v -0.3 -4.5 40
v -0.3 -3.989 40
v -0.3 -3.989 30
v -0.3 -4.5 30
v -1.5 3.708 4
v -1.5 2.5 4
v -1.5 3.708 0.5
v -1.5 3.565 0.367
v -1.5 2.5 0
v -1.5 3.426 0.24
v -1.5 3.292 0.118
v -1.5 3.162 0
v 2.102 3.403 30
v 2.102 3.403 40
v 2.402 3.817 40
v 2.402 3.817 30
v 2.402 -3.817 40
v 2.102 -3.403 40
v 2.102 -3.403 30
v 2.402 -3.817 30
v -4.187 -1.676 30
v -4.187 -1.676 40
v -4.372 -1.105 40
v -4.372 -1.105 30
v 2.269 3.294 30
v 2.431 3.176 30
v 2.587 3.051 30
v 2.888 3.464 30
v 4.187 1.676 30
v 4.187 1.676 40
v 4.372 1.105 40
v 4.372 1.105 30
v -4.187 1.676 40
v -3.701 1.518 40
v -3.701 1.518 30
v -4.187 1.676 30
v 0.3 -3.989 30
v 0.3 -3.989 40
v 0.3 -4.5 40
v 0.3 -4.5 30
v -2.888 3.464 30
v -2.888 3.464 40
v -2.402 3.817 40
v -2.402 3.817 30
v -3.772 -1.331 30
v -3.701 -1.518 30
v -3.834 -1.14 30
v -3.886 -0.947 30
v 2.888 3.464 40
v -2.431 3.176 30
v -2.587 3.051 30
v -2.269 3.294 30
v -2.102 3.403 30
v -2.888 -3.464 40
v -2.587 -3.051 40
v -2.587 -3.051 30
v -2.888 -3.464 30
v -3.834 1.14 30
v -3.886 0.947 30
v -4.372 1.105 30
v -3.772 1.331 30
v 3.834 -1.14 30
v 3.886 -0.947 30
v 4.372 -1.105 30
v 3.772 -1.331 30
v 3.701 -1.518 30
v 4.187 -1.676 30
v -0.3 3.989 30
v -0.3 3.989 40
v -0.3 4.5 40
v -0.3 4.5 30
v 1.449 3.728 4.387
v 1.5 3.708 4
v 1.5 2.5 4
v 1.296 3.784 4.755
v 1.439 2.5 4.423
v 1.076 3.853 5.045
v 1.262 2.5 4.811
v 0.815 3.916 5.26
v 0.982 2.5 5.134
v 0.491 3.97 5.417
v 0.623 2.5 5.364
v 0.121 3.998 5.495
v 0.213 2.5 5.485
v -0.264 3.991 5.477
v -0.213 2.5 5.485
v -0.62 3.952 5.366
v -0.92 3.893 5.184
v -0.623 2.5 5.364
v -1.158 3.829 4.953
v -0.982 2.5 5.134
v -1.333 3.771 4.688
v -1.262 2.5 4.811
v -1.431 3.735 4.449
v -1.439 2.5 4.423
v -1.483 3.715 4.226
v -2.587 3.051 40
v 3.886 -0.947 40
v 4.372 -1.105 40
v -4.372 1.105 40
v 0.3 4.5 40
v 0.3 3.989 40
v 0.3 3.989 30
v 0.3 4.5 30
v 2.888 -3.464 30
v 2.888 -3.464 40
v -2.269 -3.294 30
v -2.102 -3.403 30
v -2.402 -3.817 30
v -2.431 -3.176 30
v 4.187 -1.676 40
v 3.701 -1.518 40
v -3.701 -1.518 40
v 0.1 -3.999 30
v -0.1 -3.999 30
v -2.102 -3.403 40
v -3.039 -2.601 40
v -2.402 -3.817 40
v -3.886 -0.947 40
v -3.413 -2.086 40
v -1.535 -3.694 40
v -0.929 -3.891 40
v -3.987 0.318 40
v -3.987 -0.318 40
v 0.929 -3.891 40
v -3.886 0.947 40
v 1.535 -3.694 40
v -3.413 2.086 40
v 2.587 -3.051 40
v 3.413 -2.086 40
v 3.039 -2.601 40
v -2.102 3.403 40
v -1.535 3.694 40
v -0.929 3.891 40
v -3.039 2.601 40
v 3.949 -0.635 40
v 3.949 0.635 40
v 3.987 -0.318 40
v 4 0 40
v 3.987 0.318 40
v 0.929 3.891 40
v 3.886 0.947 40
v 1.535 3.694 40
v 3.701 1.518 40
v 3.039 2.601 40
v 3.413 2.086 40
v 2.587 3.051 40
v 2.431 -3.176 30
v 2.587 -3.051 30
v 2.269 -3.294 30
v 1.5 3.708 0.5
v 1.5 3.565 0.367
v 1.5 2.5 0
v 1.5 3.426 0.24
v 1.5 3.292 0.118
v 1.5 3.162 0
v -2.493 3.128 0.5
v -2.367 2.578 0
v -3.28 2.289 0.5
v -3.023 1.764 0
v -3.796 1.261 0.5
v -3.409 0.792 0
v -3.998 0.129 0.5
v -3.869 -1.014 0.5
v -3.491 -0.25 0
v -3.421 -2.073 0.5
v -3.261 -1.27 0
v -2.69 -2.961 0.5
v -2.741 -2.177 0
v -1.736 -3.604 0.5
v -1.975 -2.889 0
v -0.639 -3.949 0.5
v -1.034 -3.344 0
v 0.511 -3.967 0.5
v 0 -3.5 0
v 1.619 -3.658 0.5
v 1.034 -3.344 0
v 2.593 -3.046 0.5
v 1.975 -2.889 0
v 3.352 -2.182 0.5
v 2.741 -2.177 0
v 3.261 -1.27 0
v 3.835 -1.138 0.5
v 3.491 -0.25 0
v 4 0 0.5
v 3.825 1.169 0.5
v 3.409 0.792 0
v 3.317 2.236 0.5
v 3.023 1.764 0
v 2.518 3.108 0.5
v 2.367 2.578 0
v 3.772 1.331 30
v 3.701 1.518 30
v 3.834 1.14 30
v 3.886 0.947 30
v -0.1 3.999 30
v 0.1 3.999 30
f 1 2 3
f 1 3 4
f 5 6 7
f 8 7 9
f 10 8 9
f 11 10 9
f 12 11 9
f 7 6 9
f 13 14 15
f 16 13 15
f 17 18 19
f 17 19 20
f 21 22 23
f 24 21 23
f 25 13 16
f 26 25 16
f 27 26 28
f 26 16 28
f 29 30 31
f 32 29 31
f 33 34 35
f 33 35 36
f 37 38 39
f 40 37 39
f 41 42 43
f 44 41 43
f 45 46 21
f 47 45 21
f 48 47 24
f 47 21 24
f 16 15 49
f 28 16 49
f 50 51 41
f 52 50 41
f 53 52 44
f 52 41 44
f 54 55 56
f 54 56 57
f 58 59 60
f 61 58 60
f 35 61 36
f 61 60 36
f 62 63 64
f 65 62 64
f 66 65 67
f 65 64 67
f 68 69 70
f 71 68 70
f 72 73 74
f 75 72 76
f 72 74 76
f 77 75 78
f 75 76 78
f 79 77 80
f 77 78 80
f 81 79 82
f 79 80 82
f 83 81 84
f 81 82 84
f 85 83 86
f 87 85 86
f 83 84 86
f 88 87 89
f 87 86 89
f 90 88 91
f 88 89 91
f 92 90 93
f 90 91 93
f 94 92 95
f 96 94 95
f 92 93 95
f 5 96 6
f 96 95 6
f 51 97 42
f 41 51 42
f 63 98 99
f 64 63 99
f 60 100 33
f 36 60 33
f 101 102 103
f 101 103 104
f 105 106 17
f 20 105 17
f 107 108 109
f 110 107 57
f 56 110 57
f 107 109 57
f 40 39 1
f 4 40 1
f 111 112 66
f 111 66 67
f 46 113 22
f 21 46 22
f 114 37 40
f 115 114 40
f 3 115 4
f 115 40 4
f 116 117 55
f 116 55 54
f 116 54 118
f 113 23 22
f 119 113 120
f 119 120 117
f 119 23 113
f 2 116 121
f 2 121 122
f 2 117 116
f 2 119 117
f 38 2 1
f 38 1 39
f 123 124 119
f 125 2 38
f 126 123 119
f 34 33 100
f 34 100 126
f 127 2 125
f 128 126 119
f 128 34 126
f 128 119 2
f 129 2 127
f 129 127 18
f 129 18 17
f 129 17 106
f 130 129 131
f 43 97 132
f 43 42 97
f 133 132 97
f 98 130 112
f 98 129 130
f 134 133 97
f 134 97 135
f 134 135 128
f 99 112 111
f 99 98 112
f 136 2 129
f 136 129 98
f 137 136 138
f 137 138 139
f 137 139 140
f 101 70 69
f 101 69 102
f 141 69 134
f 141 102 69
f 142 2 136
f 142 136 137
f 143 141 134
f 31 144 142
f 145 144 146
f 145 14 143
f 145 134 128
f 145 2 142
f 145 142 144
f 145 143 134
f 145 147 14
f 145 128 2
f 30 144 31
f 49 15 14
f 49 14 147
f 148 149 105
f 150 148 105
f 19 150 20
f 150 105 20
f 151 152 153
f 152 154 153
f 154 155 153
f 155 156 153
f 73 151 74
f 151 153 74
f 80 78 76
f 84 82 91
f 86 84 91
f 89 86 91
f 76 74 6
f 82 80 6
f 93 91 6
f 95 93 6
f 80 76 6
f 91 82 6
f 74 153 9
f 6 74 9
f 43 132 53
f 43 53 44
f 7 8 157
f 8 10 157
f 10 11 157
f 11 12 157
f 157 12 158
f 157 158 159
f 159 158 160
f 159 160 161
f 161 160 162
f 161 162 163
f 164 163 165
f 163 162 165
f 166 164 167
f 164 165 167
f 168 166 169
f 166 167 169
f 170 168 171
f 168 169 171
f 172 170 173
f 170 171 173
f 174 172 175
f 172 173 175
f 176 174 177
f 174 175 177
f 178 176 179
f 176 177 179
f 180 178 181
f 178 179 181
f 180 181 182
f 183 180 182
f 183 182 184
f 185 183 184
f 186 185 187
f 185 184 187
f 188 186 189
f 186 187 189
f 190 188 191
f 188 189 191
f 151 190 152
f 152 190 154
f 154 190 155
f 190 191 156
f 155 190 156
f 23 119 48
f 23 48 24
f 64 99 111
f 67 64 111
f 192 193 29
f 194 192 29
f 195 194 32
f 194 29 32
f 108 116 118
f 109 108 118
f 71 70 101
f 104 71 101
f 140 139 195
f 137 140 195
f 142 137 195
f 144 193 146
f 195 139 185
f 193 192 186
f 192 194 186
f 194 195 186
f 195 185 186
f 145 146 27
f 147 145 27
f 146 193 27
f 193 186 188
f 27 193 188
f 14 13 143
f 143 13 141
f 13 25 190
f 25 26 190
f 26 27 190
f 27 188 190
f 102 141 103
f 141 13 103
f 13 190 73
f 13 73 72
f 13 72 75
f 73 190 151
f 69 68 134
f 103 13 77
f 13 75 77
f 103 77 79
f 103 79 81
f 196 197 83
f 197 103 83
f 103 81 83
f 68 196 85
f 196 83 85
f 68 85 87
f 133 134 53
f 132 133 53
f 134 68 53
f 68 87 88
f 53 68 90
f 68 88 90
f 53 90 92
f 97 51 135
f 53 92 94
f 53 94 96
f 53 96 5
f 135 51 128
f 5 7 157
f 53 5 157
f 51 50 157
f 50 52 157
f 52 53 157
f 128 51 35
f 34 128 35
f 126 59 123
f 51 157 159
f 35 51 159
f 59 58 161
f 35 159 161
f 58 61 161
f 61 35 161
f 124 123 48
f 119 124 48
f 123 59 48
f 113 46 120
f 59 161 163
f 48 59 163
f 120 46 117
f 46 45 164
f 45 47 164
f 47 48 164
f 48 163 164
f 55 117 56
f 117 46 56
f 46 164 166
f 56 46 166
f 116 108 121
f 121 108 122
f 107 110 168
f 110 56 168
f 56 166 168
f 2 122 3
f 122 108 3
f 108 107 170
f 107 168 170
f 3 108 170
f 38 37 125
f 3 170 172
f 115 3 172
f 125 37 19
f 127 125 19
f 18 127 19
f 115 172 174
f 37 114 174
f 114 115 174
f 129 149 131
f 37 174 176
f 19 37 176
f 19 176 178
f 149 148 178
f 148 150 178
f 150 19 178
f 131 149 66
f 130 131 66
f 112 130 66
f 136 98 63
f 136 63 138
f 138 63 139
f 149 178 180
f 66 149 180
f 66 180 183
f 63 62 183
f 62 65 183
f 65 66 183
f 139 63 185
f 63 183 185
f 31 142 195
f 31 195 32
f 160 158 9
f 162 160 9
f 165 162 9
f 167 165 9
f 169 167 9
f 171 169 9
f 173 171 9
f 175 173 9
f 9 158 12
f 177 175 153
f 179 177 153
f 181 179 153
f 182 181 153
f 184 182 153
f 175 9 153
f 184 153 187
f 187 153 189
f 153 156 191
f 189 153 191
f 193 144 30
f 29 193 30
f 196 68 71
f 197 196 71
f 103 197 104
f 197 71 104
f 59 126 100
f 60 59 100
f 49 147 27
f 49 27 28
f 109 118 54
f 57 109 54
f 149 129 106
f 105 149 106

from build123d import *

# Parameters (mm, degrees)
SKETCH1_R           = 4
BOSS_EXTRUDE1_DEPTH = 40
CUT_EXTRUDE1_START  = 2.5
CUT_EXTRUDE1_DEPTH  = 38.898019753
CHAMFER1_SIZE       = 0.5
SKETCH3_W           = 0.6
SKETCH3_H           = 1
BOSS_EXTRUDE2_DEPTH = 10
CIRPATTERN1_COUNT   = 10


with BuildPart() as part:
    # Sketch1 → Boss-Extrude1 (new body)
    with BuildSketch(Plane.XY):
        Circle(SKETCH1_R)
    extrude(amount=BOSS_EXTRUDE1_DEPTH)

    # Sketch2 → Cut-Extrude1 (cut, through all)
    with BuildSketch(Plane(origin=(0, 0, 0), x_dir=(1, 0, 0), z_dir=(0, 1, 0)).offset(CUT_EXTRUDE1_START)):
        with BuildLine():
            Line((1.5, 0), (1.5, -4))
            ThreePointArc((1.5, -4), (0, -5.5), (-1.5, -4))
            Line((-1.5, -4), (-1.5, 0))
            ThreePointArc((-1.5, 0), (0, 1.5), (1.5, 0))
        make_face()
    extrude(amount=CUT_EXTRUDE1_DEPTH, mode=Mode.SUBTRACT)

    # Chamfer1
    chamfer1_edges = [part.edges().sort_by_distance(p)[0] for p in [
        (-2.236067977, -3.31662479, 0),
    ]]
    chamfer(chamfer1_edges, length=CHAMFER1_SIZE)

    # Sketch3 → Boss-Extrude2 (add)
    with BuildSketch(Plane.XY.offset(40)):
        with Locations((0, 4)):
            Rectangle(SKETCH3_W, SKETCH3_H)
    boss_extrude2 = extrude(amount=-BOSS_EXTRUDE2_DEPTH)

    # CirPattern1: Boss-Extrude2 ×10 about axis
    cirpattern1_axis = Axis((0, 0, 0), (0, 0, 1))
    for i in range(1, CIRPATTERN1_COUNT):
        add(boss_extrude2.rotate(cirpattern1_axis, i * 360 / CIRPATTERN1_COUNT))


solid = part.part
